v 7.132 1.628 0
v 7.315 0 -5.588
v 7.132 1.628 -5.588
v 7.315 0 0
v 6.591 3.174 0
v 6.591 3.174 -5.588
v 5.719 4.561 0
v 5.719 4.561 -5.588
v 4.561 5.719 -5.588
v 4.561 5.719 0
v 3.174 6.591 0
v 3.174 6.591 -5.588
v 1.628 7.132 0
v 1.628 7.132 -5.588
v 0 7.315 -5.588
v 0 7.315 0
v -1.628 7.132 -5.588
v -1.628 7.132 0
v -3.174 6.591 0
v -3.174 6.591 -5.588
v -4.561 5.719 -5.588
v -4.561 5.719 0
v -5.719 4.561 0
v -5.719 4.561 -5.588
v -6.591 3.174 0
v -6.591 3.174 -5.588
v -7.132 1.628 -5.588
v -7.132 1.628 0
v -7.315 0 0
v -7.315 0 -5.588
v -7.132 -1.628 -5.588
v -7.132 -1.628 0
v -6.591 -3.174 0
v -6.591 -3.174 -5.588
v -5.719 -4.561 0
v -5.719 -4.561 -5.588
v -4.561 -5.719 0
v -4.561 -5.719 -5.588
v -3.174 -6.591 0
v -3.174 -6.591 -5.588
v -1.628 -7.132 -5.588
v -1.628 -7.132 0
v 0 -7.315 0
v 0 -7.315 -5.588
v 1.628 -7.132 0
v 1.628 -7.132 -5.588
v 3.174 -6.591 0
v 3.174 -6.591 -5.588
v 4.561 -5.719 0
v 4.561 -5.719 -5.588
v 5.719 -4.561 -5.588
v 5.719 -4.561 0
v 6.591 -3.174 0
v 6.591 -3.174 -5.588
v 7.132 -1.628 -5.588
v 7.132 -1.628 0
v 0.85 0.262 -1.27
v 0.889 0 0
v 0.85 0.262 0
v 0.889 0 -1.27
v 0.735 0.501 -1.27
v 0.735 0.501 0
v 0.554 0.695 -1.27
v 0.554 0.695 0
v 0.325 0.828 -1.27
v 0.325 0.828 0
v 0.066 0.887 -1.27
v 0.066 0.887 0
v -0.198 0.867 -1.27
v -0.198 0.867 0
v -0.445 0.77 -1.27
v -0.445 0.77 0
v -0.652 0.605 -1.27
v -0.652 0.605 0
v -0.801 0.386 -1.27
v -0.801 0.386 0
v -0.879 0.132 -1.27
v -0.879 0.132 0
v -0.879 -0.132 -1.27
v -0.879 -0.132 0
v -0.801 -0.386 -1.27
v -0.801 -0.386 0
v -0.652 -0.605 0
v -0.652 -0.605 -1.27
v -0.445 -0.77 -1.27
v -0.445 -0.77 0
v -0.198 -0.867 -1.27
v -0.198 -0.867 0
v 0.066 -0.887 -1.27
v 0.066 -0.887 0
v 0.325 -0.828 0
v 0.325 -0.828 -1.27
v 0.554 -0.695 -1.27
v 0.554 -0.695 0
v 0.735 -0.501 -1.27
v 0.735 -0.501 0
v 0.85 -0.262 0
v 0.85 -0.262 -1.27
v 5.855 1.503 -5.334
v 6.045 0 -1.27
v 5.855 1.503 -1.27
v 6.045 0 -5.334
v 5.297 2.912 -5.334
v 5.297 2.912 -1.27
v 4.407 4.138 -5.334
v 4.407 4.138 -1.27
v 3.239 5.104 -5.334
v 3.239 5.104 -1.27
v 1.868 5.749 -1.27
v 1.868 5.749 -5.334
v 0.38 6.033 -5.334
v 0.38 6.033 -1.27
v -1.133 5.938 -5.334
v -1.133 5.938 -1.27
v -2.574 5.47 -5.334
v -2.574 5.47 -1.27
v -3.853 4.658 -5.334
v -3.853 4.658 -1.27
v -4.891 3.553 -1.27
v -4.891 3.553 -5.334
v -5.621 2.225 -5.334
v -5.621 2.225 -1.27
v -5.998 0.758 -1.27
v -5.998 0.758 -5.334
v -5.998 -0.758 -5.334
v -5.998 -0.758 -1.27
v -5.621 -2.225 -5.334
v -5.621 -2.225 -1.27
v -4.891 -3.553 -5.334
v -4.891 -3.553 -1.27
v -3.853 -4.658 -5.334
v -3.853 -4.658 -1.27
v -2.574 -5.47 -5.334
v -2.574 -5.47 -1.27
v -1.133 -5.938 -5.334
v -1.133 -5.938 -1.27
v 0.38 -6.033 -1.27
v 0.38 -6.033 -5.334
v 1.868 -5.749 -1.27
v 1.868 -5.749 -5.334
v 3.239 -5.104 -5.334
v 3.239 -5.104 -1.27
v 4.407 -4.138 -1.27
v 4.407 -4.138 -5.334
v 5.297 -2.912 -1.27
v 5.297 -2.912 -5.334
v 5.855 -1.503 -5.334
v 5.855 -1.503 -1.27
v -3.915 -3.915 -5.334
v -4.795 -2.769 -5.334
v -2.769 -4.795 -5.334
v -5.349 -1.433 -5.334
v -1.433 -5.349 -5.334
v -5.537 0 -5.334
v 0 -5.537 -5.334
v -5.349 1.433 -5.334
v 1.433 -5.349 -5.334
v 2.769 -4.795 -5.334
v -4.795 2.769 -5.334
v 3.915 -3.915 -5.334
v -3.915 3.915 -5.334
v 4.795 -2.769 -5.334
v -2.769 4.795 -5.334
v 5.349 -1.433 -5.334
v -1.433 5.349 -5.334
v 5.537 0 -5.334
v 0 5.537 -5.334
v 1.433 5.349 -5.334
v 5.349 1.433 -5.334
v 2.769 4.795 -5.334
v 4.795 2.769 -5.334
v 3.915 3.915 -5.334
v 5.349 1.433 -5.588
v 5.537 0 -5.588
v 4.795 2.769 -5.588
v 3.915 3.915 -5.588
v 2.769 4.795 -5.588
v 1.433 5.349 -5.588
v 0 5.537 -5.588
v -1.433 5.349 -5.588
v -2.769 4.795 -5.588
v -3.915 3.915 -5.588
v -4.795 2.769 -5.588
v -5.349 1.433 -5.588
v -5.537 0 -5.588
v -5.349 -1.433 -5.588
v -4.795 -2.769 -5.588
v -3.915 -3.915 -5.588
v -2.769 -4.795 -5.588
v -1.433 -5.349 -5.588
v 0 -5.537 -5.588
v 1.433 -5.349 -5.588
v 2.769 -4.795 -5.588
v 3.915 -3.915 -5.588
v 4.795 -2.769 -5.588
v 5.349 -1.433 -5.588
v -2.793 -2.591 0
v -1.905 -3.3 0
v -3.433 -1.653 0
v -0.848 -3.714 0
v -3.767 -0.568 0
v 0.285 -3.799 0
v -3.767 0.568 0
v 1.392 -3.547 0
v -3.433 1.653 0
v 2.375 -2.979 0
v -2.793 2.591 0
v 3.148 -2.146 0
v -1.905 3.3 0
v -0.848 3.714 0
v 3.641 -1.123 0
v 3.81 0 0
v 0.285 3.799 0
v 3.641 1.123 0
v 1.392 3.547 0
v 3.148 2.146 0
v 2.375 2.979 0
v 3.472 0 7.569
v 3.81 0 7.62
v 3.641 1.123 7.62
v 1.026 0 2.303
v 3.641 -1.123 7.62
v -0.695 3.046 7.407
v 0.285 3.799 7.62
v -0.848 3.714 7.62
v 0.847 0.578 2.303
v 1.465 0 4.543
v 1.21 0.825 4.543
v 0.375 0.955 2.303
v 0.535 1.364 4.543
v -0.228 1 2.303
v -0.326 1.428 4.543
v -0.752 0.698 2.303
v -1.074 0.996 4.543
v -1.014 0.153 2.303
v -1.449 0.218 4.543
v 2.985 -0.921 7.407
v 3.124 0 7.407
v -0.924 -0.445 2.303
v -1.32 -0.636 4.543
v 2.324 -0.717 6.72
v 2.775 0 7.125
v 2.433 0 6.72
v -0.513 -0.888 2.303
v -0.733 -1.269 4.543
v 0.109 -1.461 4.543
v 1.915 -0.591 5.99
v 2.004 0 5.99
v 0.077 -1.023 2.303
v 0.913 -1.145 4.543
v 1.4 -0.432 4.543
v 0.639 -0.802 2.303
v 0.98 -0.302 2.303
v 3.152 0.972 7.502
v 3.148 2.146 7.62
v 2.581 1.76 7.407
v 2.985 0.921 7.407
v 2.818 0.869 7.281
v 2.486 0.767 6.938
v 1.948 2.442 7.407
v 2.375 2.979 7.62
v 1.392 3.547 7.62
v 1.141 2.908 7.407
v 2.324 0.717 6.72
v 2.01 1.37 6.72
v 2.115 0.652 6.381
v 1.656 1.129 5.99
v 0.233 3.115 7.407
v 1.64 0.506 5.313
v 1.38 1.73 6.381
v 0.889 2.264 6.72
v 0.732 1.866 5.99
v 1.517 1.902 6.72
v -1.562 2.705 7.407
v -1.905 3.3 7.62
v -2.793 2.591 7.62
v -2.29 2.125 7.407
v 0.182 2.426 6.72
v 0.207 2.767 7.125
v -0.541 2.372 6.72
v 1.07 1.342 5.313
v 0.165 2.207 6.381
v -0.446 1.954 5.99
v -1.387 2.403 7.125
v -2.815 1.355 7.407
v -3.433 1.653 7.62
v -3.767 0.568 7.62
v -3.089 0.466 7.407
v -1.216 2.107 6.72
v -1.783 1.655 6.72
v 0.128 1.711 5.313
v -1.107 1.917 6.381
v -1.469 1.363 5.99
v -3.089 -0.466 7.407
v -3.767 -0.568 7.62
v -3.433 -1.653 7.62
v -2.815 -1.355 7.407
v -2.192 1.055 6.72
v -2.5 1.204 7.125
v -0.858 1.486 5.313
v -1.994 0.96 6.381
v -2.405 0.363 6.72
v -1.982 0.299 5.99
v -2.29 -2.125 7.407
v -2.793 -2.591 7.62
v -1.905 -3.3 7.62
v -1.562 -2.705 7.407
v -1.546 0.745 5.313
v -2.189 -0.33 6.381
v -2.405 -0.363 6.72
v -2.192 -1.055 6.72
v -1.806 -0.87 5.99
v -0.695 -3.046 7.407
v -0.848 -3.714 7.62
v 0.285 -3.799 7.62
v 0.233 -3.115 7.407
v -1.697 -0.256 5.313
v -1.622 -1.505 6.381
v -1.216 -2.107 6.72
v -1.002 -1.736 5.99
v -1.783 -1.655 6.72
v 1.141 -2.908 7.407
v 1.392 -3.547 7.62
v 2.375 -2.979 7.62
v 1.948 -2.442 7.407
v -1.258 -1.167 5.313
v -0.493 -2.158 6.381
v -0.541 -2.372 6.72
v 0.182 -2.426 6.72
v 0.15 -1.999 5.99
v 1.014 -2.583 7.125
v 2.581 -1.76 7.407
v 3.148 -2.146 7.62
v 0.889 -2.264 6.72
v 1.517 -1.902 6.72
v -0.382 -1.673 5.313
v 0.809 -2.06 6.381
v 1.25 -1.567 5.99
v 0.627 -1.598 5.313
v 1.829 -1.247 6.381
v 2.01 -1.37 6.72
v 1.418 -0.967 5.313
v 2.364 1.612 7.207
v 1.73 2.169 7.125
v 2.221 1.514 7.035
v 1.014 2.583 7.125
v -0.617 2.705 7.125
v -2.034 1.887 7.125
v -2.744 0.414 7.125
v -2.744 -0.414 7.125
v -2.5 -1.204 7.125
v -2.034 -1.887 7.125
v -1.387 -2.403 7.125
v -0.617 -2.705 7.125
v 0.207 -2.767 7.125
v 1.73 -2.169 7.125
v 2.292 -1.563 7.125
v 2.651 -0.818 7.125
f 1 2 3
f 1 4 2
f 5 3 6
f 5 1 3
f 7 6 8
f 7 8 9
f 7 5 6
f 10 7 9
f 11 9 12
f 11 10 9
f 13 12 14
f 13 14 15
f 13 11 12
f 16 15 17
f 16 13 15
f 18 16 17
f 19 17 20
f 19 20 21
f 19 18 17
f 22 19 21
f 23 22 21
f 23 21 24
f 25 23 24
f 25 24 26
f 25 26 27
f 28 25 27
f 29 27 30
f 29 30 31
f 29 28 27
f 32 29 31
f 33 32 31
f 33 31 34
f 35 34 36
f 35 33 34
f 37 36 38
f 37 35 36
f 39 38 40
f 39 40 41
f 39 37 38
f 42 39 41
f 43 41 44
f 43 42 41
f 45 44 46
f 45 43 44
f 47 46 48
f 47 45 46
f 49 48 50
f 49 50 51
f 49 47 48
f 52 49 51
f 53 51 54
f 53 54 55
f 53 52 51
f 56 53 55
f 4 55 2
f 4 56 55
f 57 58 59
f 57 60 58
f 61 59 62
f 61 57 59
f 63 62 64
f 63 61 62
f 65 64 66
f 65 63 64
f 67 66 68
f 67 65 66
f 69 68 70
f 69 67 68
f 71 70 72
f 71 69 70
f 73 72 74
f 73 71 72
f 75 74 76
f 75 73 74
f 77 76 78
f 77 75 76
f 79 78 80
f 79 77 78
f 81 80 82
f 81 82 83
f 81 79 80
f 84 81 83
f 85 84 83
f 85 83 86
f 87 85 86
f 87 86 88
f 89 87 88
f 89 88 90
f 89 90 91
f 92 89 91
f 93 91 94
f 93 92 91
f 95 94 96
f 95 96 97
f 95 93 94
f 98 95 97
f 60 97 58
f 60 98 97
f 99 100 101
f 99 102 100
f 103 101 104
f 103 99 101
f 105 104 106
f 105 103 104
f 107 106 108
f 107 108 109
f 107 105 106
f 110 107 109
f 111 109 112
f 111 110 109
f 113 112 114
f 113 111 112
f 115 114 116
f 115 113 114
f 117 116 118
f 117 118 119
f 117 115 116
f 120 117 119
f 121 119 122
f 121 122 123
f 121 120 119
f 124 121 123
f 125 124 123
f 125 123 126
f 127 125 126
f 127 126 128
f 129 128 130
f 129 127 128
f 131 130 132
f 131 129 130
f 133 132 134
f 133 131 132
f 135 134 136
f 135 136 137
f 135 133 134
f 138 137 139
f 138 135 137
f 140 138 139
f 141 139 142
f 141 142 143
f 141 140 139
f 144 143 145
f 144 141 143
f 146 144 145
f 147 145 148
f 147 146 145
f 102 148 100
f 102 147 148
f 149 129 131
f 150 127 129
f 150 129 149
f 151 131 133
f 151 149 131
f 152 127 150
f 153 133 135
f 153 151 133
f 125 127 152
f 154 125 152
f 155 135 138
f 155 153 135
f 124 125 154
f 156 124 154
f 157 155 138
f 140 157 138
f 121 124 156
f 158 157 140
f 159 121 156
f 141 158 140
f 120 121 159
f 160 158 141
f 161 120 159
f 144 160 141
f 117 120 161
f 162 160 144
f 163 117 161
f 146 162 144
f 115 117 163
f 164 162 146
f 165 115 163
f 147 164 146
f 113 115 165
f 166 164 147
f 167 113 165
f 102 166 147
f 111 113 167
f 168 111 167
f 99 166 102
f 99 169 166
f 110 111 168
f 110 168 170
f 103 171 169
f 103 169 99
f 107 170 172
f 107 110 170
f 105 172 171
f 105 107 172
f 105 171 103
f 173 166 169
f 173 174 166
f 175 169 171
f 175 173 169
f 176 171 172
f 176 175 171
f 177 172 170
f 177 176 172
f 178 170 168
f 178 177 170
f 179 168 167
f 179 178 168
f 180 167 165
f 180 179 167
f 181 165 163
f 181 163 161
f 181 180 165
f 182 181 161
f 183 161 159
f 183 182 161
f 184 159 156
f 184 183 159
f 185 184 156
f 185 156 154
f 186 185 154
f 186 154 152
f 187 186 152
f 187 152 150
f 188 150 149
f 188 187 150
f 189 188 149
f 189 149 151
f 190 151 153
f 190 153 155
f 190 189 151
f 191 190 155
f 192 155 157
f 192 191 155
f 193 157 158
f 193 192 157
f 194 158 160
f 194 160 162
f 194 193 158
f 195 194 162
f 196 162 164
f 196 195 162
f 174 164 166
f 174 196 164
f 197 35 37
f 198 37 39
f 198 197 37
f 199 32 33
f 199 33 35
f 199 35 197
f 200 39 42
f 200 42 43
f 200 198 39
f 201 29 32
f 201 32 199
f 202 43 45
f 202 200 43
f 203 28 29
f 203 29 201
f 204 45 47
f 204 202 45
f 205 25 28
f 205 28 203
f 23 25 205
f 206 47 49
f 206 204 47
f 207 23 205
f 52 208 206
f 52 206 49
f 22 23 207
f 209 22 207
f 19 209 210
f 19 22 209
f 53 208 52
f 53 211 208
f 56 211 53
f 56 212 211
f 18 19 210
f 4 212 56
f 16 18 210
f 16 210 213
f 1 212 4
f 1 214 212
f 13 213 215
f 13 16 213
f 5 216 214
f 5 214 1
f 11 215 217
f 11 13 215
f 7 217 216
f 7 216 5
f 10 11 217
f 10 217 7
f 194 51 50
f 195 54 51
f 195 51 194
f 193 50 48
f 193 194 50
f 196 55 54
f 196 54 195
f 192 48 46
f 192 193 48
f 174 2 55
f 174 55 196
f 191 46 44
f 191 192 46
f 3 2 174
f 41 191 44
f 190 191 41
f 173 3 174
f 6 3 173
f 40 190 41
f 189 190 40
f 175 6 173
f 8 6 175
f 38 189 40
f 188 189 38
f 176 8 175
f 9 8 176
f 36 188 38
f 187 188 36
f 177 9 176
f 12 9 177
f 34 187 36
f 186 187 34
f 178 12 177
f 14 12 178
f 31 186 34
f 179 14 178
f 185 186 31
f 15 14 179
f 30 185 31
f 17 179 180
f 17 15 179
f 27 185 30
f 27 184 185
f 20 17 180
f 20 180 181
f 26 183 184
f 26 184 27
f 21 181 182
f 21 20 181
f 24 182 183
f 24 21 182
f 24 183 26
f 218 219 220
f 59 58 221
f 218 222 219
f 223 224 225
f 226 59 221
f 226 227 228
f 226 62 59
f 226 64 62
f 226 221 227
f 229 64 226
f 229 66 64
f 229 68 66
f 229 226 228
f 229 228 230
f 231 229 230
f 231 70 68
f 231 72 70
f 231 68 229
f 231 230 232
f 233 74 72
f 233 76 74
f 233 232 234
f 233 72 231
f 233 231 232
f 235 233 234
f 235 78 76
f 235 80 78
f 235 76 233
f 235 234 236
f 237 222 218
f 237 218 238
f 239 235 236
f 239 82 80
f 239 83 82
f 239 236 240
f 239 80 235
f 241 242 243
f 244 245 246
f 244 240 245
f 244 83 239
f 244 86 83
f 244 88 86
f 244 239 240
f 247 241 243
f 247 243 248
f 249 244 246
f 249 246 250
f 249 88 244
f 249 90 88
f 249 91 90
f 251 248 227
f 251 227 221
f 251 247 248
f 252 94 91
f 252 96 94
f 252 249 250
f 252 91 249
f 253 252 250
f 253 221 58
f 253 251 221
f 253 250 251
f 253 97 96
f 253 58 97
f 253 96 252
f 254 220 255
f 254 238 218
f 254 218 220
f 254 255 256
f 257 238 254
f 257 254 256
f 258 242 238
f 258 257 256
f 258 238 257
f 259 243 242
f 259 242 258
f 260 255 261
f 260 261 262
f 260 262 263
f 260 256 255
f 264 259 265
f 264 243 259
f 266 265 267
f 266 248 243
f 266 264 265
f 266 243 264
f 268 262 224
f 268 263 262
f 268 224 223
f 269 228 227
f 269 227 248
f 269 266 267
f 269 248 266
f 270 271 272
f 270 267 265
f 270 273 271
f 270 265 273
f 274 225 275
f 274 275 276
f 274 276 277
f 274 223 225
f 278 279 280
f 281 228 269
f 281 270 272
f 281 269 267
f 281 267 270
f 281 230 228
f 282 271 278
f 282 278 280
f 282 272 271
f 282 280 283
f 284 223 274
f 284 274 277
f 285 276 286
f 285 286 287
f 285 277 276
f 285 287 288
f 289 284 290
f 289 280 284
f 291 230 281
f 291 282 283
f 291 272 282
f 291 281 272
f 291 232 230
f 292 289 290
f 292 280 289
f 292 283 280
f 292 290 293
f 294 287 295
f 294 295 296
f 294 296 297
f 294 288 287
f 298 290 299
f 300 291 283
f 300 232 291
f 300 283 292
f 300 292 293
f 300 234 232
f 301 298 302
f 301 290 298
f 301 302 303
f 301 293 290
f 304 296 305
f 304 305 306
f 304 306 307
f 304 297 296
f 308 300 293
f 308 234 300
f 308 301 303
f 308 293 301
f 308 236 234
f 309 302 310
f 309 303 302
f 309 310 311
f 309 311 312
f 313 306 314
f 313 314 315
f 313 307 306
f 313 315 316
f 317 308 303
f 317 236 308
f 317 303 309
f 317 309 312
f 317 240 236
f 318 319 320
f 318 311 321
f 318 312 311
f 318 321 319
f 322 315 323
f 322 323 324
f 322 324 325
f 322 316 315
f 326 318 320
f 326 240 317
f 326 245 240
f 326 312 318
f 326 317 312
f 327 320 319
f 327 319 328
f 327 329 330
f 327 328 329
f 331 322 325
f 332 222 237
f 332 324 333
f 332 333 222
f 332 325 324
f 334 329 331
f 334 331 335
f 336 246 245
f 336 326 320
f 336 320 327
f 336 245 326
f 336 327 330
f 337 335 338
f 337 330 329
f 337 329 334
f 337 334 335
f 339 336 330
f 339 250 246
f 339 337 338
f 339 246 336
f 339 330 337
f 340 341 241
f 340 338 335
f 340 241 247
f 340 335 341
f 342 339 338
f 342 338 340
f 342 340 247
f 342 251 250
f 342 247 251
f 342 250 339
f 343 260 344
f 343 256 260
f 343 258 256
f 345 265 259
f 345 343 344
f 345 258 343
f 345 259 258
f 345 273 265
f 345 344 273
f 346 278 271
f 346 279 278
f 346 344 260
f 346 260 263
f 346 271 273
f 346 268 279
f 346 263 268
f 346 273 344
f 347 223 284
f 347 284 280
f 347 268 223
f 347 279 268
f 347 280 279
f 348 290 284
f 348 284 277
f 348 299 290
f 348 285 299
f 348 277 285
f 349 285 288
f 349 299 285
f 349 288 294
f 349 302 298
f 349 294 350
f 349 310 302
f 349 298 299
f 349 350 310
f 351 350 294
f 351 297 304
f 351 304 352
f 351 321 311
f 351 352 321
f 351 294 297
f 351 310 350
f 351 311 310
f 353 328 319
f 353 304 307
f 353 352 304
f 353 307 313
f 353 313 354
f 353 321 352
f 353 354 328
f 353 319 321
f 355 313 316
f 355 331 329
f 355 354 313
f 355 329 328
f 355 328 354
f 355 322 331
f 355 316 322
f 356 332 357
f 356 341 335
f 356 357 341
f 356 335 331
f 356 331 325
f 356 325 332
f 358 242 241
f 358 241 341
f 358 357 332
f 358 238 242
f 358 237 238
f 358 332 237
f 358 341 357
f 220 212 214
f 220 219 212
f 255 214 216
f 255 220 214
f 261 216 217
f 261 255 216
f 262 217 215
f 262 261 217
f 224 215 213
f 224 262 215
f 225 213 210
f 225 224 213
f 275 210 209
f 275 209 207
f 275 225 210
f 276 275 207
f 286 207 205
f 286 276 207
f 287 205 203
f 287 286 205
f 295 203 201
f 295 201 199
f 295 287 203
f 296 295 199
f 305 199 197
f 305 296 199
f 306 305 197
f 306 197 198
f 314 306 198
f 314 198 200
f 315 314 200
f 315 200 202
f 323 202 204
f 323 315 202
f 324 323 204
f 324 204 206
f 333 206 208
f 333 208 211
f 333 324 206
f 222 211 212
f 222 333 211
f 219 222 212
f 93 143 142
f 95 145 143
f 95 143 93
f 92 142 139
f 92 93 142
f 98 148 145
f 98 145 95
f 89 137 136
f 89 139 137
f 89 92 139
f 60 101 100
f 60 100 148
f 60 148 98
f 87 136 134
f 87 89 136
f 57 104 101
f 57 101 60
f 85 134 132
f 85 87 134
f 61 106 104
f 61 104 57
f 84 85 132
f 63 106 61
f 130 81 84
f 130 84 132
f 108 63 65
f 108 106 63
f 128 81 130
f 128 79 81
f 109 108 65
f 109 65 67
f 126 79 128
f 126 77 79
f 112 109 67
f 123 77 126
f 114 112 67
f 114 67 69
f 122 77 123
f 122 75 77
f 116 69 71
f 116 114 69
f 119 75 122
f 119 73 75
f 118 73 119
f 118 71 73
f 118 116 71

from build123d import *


with BuildPart() as f1:
    # F0 (on Front) → F1 (revolve)
    with BuildSketch(Plane.XZ):
        with BuildLine():
            Line((3.81, 0), (3.81, 7.62))
            add(Edge.make_bspline(
                [(3.81, 7.62), (0.889, 7.62), (0.889, 0)],
                knots=[0, 0, 0, 1.5707963268, 1.5707963268, 1.5707963268], degree=2, weights=[1, 0.7071067812, 1]))
            Line((0.889, 0), (3.81, 0))
        make_face()
        Polygon((7.3152, 0), (3.81, 0), (0.889, 0), (0.889, -1.27), (6.0452, -1.27), (6.0452, -5.334), (7.3152, -5.334), align=None)
        Polygon((7.3152, -5.588), (7.3152, -5.334), (6.0452, -5.334), (5.5372, -5.334), (5.5372, -5.588), align=None)
    revolve(axis=Axis((0, 0, 8.5612153634), (0, 0, 1)))


solid = f1.part
